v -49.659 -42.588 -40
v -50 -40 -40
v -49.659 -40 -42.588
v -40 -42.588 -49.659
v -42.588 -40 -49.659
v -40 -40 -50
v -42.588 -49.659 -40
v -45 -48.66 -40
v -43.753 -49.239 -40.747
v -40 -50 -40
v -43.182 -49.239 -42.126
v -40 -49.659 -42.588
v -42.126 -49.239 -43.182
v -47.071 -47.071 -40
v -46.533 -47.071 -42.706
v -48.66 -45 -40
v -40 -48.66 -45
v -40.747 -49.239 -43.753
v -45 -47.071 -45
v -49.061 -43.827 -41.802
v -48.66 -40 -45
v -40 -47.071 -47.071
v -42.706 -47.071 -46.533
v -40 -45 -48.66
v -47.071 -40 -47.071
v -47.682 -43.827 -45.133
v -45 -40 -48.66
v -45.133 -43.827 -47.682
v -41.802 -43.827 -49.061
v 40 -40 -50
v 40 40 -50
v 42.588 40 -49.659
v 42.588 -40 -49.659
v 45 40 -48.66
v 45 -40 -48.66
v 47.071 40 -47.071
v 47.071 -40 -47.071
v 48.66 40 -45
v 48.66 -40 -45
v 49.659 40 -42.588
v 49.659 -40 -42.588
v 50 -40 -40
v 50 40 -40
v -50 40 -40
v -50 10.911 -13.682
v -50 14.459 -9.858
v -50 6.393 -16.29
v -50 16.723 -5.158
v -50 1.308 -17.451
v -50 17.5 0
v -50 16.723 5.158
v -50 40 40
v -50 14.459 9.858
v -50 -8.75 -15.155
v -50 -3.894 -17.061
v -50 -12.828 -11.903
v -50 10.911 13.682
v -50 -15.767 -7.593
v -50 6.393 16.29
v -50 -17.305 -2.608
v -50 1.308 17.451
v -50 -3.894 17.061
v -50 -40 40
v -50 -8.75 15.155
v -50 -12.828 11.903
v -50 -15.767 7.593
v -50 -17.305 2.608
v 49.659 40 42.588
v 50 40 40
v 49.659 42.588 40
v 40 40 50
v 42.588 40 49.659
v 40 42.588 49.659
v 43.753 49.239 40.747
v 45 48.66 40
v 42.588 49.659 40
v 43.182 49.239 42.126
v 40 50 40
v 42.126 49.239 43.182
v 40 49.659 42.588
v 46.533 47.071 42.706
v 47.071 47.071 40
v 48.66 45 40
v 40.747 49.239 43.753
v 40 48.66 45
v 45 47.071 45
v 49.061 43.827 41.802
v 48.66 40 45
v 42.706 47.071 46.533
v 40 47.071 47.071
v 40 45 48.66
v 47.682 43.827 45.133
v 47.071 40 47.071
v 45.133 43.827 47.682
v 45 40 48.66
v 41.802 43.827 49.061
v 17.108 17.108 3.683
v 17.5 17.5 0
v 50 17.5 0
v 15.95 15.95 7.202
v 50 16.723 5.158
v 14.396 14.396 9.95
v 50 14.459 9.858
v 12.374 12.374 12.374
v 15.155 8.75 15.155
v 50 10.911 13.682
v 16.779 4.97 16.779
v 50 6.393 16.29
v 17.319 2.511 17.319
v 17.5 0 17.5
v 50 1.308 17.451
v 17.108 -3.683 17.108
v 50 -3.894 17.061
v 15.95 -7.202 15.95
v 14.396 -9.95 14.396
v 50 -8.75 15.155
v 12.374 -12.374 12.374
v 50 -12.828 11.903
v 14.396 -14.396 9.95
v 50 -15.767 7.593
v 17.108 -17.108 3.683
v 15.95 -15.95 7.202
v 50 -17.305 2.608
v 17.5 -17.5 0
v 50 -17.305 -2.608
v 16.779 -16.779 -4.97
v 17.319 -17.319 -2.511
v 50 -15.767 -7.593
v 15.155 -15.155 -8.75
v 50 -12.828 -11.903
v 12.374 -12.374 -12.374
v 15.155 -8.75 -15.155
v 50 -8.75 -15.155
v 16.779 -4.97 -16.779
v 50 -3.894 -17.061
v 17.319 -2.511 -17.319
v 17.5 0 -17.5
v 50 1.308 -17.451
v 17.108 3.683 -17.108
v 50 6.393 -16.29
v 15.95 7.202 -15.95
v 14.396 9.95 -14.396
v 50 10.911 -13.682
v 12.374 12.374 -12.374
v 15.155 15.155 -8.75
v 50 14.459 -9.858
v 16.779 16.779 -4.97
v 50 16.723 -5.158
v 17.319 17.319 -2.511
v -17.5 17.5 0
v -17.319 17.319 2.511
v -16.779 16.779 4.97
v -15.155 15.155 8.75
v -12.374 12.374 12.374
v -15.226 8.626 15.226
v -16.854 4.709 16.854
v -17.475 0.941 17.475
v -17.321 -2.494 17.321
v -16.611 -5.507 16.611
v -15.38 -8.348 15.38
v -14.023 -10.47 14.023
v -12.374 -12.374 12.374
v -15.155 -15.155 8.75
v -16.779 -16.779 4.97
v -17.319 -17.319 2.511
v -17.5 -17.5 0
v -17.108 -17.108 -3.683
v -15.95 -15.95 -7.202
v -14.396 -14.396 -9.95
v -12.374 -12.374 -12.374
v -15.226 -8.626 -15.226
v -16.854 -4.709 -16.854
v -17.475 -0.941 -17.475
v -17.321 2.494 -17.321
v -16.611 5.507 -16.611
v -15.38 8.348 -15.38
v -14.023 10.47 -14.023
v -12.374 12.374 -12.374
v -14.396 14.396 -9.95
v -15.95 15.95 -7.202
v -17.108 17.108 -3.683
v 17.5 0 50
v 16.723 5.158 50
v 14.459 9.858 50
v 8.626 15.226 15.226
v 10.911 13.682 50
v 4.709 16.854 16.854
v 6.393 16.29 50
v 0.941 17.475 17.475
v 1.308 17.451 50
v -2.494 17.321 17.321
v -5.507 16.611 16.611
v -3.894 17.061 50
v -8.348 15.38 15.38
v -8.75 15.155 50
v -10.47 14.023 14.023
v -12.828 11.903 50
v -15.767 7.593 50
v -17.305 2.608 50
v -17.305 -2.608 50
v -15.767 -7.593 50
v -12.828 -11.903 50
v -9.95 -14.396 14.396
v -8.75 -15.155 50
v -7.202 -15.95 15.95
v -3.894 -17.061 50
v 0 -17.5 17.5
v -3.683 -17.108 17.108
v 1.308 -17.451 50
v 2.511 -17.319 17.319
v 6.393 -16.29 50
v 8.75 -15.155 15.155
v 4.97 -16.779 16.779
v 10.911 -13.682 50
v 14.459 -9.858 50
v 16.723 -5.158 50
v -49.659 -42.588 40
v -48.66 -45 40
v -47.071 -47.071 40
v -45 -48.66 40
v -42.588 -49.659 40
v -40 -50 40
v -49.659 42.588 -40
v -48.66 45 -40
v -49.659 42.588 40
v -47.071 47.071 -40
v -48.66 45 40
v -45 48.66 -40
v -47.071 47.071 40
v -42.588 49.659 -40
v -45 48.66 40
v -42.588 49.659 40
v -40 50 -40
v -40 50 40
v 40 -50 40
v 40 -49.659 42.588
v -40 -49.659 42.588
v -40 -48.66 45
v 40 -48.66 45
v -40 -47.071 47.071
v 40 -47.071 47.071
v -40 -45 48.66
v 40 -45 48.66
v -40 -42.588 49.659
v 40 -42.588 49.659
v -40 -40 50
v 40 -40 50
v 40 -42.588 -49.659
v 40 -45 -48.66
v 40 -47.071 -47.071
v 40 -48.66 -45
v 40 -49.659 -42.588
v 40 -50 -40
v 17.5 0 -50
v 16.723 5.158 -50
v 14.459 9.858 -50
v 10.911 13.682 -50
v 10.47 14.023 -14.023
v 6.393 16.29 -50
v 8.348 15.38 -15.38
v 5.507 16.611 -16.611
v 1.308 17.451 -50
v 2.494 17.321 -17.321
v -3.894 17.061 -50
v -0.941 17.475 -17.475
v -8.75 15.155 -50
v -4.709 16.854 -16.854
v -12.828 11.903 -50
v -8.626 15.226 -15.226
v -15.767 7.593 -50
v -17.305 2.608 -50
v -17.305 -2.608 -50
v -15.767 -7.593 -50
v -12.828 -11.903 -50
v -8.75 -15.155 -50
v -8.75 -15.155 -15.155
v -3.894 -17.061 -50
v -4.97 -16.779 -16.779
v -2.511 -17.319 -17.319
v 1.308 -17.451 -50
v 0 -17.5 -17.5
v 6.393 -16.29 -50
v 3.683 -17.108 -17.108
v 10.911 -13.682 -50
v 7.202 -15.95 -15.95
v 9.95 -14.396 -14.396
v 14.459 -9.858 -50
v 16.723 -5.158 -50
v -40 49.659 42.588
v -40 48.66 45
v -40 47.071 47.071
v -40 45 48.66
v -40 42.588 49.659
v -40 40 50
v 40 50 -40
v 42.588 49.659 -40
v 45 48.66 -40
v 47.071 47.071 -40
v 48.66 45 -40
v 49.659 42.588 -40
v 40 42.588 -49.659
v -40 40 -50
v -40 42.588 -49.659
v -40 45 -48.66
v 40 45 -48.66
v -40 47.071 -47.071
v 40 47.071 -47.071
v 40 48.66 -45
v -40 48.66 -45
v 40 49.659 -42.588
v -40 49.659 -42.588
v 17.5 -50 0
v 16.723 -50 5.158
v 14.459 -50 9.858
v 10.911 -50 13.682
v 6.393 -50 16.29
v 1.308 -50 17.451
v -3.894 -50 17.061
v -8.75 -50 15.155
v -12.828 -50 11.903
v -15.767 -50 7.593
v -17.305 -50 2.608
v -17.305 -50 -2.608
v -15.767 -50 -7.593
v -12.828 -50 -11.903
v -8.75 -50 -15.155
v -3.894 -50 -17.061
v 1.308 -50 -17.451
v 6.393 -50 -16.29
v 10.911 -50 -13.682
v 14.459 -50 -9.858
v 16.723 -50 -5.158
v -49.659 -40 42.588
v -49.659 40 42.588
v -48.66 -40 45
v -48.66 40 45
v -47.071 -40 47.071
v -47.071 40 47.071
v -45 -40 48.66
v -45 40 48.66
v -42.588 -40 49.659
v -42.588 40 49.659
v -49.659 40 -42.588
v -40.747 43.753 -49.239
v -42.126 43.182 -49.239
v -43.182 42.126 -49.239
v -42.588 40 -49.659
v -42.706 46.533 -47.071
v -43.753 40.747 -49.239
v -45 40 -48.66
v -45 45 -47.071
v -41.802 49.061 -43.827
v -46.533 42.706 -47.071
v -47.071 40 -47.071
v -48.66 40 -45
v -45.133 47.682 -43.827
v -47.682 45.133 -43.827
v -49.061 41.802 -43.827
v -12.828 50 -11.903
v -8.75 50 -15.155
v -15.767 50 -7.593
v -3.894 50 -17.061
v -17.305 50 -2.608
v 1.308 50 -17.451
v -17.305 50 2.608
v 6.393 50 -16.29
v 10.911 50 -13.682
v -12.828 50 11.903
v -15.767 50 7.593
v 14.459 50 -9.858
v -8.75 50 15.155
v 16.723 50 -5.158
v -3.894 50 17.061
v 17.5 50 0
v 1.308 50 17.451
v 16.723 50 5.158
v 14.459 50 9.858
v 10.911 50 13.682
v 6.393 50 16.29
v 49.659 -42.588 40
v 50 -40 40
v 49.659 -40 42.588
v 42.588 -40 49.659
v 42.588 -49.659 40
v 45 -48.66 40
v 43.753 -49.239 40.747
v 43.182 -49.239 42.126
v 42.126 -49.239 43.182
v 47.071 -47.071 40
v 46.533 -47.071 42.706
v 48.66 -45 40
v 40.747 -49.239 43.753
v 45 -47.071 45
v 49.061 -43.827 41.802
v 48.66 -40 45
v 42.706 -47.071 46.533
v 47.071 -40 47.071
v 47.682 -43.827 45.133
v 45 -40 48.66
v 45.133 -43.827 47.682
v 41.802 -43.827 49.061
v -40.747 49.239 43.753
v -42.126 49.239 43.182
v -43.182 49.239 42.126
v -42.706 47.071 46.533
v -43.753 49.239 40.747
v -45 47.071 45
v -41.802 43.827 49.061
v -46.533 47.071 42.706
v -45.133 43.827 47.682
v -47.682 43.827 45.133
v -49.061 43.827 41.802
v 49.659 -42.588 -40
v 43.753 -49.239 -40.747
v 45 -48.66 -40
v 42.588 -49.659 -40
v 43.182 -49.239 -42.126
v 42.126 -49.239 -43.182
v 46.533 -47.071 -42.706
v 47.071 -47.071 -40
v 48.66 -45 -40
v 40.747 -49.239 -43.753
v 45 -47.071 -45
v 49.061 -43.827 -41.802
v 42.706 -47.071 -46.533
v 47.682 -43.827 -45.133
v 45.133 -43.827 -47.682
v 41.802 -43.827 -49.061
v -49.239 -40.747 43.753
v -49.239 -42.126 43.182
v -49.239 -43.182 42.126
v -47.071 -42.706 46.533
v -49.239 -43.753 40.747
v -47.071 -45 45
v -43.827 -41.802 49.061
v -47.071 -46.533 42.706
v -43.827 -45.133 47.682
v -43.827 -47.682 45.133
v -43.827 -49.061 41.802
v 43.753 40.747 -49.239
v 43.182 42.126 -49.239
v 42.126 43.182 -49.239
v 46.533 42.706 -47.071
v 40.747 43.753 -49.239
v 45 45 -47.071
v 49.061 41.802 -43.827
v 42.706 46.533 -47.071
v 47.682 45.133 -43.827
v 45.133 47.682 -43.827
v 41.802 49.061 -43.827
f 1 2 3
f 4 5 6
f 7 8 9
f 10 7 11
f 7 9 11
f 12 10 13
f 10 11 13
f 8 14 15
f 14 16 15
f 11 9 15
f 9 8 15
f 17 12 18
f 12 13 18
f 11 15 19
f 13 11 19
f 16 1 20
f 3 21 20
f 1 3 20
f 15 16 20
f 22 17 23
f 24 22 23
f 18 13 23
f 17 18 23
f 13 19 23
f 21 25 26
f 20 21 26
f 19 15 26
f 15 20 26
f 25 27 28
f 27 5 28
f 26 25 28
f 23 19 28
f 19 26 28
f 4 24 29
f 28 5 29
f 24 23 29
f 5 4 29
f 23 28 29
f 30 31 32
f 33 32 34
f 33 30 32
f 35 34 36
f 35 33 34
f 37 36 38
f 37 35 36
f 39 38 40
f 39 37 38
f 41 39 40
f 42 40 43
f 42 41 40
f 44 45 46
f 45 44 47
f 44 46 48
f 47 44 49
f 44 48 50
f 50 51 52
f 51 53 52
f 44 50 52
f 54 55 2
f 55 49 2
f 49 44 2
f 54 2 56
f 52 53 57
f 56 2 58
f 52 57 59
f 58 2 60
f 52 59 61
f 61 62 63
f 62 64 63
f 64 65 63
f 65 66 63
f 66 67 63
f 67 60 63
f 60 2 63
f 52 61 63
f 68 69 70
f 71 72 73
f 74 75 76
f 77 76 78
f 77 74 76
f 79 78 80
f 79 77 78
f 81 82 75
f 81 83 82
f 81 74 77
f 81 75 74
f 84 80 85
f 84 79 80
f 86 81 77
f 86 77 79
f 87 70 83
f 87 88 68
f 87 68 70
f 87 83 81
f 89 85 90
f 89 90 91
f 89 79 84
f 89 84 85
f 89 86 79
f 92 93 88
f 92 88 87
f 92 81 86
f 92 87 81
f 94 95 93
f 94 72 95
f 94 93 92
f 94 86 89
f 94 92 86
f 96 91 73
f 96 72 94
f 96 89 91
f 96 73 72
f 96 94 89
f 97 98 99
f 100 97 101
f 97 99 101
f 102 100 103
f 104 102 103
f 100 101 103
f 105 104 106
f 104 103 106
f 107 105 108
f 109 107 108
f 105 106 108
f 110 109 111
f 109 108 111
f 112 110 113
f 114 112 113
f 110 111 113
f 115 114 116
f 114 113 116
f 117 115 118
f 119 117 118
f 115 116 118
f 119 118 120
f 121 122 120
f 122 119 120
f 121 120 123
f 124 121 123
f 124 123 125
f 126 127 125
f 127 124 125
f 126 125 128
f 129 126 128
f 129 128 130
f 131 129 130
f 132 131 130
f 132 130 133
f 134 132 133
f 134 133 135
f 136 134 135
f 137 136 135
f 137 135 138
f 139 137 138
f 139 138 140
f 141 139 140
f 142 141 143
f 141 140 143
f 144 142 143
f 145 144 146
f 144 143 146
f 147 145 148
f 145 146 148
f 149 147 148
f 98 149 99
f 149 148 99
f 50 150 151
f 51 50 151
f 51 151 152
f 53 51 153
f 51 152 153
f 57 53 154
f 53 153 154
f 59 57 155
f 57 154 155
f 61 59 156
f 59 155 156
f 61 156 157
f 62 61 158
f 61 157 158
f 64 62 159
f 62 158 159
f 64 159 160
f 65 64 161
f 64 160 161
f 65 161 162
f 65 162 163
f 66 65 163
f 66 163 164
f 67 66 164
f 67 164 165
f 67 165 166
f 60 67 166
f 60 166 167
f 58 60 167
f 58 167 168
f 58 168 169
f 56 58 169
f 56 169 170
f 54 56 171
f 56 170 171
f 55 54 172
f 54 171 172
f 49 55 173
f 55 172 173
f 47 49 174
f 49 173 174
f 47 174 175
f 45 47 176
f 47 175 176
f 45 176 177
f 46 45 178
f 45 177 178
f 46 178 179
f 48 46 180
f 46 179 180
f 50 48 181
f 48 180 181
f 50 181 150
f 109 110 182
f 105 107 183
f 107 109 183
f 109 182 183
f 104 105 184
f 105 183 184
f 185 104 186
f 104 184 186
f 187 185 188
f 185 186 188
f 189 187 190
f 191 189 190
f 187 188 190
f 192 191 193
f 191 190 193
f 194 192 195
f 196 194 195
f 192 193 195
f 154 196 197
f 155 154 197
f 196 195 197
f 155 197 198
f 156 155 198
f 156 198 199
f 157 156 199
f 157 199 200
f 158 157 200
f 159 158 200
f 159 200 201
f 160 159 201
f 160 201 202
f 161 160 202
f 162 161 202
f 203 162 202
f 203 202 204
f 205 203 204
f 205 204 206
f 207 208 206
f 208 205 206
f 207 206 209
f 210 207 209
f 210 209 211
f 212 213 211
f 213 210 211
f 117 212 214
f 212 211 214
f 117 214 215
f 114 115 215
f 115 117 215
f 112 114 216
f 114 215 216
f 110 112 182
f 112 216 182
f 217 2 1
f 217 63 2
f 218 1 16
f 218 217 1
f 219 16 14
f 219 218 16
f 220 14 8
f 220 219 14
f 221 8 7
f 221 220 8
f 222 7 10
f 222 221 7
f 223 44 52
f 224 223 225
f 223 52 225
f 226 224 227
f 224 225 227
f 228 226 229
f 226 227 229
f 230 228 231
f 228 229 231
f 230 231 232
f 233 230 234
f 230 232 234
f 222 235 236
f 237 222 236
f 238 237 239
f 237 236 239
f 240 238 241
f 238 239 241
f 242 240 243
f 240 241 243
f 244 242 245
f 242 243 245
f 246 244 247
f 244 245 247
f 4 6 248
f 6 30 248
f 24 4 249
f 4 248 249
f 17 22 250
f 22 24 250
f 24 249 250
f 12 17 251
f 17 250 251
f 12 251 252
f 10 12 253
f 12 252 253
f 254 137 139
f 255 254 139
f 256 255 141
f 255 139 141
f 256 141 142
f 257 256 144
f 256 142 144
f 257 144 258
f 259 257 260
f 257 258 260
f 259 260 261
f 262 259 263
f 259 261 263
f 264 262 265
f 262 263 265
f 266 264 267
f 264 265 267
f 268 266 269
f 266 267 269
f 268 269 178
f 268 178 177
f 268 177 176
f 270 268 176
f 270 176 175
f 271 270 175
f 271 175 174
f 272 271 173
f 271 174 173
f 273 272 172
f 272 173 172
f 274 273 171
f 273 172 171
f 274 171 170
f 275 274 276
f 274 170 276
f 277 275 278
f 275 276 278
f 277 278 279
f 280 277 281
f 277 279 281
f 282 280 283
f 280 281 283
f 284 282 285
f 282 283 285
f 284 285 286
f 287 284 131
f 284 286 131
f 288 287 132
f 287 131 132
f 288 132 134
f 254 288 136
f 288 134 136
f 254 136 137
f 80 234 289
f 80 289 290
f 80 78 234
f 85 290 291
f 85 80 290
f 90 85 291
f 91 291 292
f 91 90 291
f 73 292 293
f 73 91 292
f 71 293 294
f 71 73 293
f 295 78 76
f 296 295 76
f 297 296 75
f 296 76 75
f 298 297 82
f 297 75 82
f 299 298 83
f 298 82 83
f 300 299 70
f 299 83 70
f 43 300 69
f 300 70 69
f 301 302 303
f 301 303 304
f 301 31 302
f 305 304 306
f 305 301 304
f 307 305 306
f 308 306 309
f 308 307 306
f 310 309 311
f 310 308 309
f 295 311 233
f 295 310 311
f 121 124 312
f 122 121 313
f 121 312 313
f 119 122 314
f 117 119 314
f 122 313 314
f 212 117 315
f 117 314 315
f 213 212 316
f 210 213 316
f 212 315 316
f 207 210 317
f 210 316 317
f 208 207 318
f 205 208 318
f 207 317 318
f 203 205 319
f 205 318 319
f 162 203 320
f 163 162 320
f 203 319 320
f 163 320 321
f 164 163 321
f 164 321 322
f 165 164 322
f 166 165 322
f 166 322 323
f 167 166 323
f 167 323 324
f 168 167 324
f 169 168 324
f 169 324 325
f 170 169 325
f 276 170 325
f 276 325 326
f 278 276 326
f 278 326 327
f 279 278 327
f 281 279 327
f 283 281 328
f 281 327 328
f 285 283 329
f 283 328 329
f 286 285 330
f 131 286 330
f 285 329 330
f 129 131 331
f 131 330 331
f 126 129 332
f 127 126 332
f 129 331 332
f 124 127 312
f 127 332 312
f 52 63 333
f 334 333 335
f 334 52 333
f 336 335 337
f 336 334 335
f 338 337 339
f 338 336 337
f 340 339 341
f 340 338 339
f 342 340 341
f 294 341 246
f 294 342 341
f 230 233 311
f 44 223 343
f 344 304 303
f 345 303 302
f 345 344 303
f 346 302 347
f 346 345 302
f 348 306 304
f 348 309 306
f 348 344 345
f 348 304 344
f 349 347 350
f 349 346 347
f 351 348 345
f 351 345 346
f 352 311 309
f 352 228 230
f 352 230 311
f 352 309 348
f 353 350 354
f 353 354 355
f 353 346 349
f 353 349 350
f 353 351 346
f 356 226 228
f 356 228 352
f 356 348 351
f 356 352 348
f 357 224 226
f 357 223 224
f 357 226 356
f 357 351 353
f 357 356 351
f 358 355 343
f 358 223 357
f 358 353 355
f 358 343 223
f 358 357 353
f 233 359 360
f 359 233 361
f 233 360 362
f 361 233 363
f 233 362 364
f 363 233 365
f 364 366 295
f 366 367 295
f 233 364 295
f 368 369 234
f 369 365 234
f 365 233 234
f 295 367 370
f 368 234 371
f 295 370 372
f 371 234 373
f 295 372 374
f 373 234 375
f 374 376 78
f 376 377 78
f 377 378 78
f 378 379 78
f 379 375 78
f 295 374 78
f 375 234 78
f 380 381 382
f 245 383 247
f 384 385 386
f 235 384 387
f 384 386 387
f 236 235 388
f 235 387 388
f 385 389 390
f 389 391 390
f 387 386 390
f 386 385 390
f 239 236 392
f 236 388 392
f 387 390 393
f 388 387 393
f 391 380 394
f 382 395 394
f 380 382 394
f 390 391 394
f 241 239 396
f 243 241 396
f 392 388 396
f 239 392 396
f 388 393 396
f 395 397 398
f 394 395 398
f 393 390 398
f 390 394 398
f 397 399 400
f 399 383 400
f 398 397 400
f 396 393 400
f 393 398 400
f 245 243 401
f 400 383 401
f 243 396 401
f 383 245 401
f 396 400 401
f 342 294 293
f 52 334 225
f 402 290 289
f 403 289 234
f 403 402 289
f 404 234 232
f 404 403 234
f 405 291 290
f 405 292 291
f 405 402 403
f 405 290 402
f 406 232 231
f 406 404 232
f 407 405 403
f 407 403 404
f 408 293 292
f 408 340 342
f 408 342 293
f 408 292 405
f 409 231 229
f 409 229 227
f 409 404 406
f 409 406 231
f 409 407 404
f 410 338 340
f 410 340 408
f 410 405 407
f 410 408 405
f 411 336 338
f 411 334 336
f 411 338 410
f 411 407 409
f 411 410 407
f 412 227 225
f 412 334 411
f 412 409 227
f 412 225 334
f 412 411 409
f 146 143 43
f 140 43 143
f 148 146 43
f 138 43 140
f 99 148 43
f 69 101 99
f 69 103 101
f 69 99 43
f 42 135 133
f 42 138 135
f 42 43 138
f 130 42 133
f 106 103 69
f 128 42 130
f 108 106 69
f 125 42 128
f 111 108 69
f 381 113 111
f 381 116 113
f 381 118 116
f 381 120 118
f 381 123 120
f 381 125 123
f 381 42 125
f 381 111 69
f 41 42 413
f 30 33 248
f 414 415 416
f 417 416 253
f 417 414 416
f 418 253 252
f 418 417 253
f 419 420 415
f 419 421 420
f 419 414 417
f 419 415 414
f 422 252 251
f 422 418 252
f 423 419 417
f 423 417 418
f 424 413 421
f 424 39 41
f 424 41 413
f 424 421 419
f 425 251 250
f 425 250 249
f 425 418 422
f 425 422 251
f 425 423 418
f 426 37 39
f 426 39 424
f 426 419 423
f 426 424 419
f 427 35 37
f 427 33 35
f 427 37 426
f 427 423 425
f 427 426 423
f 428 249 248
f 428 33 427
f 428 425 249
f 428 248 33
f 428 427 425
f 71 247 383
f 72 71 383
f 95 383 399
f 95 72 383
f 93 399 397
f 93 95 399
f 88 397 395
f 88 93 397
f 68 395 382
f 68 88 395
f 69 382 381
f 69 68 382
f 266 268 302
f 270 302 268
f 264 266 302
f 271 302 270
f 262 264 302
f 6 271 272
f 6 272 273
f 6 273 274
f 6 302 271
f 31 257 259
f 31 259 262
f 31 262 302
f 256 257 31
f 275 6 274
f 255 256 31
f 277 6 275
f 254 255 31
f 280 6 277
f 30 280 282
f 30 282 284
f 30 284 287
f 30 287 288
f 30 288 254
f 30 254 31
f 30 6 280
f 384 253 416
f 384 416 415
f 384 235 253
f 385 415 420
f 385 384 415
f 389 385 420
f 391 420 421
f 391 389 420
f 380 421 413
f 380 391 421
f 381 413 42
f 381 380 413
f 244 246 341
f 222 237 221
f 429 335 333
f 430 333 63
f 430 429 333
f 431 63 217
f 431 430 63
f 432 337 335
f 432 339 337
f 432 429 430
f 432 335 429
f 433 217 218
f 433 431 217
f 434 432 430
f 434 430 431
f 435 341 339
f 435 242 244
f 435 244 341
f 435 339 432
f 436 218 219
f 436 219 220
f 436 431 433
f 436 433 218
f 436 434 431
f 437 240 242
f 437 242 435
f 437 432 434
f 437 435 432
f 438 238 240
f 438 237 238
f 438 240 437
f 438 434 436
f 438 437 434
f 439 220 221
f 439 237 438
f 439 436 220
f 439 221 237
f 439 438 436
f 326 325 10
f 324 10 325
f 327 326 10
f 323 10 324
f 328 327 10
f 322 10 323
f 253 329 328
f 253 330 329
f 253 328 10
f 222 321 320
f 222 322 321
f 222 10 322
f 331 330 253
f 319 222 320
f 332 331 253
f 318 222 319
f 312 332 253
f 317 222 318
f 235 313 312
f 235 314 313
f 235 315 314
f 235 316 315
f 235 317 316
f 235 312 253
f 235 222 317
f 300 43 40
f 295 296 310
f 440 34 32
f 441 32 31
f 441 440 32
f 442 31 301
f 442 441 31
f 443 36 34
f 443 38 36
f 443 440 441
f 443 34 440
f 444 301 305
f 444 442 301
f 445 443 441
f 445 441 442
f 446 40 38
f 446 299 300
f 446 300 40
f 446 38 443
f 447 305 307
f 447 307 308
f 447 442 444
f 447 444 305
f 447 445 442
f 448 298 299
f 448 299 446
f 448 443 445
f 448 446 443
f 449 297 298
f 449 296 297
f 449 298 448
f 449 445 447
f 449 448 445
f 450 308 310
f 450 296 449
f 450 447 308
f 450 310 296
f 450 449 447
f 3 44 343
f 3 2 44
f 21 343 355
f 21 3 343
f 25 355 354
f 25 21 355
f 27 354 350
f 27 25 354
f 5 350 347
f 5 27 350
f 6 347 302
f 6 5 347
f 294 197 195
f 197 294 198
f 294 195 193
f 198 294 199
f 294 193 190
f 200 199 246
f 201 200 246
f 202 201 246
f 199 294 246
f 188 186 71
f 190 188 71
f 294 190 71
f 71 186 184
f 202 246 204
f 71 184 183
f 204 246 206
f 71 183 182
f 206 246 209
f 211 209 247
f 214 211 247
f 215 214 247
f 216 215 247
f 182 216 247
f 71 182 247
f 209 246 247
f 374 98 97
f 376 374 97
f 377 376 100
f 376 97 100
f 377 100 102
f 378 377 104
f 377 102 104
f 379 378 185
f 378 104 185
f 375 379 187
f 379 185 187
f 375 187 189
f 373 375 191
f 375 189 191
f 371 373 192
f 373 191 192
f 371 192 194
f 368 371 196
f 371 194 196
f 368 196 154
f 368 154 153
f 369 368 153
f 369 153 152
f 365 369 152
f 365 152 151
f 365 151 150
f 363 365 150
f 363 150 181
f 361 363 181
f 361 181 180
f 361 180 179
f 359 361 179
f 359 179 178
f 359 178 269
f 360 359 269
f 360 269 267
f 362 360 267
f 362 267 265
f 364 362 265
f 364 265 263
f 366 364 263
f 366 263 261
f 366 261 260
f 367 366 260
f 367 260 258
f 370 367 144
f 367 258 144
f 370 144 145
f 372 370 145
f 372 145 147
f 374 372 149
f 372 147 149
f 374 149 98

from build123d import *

# Parameters (mm, degrees)
F0_W     = 100
F0_H     = 100
F1_DEPTH = 50
F2_R     = 17.5
F3_DEPTH = 100
F4_R     = 17.5
F5_DEPTH = 100
F6_R     = 17.5
F7_DEPTH = 100
F8_R     = 10


with BuildPart() as f1:
    # F0 (on Front) → F1 (new body, symmetric)
    with BuildSketch(Plane.XZ):
        Rectangle(F0_W, F0_H)
    extrude(amount=F1_DEPTH, both=True)

    # F2 (on face) → F3 (cut, through all)
    with BuildSketch(Plane.XZ.offset(50)):
        Circle(F2_R)
    extrude(amount=-F3_DEPTH, mode=Mode.SUBTRACT)

    # F4 (on face) → F5 (cut, through all)
    with BuildSketch(Plane.YZ.offset(50)):
        Circle(F4_R)
    extrude(amount=-F5_DEPTH, mode=Mode.SUBTRACT)

    # F6 (on face) → F7 (cut, through all)
    with BuildSketch(Plane.XY.offset(50)):
        Circle(F6_R)
    extrude(amount=-F7_DEPTH, mode=Mode.SUBTRACT)

    # F8
    f8_edges = [f1.edges().sort_by_distance(p)[0] for p in [
        (50, 0, 50),
        (50, 50, 0),
        (50, 0, -50),
        (50, -50, 0),
        (0, -50, 50),
        (-50, 0, 50),
        (0, 50, 50),
        (-50, 50, 0),
        (0, 50, -50),
        (-50, 0, -50),
        (-50, -50, 0),
        (0, -50, -50),
    ]]
    fillet(f8_edges, radius=F8_R)


solid = f1.part
